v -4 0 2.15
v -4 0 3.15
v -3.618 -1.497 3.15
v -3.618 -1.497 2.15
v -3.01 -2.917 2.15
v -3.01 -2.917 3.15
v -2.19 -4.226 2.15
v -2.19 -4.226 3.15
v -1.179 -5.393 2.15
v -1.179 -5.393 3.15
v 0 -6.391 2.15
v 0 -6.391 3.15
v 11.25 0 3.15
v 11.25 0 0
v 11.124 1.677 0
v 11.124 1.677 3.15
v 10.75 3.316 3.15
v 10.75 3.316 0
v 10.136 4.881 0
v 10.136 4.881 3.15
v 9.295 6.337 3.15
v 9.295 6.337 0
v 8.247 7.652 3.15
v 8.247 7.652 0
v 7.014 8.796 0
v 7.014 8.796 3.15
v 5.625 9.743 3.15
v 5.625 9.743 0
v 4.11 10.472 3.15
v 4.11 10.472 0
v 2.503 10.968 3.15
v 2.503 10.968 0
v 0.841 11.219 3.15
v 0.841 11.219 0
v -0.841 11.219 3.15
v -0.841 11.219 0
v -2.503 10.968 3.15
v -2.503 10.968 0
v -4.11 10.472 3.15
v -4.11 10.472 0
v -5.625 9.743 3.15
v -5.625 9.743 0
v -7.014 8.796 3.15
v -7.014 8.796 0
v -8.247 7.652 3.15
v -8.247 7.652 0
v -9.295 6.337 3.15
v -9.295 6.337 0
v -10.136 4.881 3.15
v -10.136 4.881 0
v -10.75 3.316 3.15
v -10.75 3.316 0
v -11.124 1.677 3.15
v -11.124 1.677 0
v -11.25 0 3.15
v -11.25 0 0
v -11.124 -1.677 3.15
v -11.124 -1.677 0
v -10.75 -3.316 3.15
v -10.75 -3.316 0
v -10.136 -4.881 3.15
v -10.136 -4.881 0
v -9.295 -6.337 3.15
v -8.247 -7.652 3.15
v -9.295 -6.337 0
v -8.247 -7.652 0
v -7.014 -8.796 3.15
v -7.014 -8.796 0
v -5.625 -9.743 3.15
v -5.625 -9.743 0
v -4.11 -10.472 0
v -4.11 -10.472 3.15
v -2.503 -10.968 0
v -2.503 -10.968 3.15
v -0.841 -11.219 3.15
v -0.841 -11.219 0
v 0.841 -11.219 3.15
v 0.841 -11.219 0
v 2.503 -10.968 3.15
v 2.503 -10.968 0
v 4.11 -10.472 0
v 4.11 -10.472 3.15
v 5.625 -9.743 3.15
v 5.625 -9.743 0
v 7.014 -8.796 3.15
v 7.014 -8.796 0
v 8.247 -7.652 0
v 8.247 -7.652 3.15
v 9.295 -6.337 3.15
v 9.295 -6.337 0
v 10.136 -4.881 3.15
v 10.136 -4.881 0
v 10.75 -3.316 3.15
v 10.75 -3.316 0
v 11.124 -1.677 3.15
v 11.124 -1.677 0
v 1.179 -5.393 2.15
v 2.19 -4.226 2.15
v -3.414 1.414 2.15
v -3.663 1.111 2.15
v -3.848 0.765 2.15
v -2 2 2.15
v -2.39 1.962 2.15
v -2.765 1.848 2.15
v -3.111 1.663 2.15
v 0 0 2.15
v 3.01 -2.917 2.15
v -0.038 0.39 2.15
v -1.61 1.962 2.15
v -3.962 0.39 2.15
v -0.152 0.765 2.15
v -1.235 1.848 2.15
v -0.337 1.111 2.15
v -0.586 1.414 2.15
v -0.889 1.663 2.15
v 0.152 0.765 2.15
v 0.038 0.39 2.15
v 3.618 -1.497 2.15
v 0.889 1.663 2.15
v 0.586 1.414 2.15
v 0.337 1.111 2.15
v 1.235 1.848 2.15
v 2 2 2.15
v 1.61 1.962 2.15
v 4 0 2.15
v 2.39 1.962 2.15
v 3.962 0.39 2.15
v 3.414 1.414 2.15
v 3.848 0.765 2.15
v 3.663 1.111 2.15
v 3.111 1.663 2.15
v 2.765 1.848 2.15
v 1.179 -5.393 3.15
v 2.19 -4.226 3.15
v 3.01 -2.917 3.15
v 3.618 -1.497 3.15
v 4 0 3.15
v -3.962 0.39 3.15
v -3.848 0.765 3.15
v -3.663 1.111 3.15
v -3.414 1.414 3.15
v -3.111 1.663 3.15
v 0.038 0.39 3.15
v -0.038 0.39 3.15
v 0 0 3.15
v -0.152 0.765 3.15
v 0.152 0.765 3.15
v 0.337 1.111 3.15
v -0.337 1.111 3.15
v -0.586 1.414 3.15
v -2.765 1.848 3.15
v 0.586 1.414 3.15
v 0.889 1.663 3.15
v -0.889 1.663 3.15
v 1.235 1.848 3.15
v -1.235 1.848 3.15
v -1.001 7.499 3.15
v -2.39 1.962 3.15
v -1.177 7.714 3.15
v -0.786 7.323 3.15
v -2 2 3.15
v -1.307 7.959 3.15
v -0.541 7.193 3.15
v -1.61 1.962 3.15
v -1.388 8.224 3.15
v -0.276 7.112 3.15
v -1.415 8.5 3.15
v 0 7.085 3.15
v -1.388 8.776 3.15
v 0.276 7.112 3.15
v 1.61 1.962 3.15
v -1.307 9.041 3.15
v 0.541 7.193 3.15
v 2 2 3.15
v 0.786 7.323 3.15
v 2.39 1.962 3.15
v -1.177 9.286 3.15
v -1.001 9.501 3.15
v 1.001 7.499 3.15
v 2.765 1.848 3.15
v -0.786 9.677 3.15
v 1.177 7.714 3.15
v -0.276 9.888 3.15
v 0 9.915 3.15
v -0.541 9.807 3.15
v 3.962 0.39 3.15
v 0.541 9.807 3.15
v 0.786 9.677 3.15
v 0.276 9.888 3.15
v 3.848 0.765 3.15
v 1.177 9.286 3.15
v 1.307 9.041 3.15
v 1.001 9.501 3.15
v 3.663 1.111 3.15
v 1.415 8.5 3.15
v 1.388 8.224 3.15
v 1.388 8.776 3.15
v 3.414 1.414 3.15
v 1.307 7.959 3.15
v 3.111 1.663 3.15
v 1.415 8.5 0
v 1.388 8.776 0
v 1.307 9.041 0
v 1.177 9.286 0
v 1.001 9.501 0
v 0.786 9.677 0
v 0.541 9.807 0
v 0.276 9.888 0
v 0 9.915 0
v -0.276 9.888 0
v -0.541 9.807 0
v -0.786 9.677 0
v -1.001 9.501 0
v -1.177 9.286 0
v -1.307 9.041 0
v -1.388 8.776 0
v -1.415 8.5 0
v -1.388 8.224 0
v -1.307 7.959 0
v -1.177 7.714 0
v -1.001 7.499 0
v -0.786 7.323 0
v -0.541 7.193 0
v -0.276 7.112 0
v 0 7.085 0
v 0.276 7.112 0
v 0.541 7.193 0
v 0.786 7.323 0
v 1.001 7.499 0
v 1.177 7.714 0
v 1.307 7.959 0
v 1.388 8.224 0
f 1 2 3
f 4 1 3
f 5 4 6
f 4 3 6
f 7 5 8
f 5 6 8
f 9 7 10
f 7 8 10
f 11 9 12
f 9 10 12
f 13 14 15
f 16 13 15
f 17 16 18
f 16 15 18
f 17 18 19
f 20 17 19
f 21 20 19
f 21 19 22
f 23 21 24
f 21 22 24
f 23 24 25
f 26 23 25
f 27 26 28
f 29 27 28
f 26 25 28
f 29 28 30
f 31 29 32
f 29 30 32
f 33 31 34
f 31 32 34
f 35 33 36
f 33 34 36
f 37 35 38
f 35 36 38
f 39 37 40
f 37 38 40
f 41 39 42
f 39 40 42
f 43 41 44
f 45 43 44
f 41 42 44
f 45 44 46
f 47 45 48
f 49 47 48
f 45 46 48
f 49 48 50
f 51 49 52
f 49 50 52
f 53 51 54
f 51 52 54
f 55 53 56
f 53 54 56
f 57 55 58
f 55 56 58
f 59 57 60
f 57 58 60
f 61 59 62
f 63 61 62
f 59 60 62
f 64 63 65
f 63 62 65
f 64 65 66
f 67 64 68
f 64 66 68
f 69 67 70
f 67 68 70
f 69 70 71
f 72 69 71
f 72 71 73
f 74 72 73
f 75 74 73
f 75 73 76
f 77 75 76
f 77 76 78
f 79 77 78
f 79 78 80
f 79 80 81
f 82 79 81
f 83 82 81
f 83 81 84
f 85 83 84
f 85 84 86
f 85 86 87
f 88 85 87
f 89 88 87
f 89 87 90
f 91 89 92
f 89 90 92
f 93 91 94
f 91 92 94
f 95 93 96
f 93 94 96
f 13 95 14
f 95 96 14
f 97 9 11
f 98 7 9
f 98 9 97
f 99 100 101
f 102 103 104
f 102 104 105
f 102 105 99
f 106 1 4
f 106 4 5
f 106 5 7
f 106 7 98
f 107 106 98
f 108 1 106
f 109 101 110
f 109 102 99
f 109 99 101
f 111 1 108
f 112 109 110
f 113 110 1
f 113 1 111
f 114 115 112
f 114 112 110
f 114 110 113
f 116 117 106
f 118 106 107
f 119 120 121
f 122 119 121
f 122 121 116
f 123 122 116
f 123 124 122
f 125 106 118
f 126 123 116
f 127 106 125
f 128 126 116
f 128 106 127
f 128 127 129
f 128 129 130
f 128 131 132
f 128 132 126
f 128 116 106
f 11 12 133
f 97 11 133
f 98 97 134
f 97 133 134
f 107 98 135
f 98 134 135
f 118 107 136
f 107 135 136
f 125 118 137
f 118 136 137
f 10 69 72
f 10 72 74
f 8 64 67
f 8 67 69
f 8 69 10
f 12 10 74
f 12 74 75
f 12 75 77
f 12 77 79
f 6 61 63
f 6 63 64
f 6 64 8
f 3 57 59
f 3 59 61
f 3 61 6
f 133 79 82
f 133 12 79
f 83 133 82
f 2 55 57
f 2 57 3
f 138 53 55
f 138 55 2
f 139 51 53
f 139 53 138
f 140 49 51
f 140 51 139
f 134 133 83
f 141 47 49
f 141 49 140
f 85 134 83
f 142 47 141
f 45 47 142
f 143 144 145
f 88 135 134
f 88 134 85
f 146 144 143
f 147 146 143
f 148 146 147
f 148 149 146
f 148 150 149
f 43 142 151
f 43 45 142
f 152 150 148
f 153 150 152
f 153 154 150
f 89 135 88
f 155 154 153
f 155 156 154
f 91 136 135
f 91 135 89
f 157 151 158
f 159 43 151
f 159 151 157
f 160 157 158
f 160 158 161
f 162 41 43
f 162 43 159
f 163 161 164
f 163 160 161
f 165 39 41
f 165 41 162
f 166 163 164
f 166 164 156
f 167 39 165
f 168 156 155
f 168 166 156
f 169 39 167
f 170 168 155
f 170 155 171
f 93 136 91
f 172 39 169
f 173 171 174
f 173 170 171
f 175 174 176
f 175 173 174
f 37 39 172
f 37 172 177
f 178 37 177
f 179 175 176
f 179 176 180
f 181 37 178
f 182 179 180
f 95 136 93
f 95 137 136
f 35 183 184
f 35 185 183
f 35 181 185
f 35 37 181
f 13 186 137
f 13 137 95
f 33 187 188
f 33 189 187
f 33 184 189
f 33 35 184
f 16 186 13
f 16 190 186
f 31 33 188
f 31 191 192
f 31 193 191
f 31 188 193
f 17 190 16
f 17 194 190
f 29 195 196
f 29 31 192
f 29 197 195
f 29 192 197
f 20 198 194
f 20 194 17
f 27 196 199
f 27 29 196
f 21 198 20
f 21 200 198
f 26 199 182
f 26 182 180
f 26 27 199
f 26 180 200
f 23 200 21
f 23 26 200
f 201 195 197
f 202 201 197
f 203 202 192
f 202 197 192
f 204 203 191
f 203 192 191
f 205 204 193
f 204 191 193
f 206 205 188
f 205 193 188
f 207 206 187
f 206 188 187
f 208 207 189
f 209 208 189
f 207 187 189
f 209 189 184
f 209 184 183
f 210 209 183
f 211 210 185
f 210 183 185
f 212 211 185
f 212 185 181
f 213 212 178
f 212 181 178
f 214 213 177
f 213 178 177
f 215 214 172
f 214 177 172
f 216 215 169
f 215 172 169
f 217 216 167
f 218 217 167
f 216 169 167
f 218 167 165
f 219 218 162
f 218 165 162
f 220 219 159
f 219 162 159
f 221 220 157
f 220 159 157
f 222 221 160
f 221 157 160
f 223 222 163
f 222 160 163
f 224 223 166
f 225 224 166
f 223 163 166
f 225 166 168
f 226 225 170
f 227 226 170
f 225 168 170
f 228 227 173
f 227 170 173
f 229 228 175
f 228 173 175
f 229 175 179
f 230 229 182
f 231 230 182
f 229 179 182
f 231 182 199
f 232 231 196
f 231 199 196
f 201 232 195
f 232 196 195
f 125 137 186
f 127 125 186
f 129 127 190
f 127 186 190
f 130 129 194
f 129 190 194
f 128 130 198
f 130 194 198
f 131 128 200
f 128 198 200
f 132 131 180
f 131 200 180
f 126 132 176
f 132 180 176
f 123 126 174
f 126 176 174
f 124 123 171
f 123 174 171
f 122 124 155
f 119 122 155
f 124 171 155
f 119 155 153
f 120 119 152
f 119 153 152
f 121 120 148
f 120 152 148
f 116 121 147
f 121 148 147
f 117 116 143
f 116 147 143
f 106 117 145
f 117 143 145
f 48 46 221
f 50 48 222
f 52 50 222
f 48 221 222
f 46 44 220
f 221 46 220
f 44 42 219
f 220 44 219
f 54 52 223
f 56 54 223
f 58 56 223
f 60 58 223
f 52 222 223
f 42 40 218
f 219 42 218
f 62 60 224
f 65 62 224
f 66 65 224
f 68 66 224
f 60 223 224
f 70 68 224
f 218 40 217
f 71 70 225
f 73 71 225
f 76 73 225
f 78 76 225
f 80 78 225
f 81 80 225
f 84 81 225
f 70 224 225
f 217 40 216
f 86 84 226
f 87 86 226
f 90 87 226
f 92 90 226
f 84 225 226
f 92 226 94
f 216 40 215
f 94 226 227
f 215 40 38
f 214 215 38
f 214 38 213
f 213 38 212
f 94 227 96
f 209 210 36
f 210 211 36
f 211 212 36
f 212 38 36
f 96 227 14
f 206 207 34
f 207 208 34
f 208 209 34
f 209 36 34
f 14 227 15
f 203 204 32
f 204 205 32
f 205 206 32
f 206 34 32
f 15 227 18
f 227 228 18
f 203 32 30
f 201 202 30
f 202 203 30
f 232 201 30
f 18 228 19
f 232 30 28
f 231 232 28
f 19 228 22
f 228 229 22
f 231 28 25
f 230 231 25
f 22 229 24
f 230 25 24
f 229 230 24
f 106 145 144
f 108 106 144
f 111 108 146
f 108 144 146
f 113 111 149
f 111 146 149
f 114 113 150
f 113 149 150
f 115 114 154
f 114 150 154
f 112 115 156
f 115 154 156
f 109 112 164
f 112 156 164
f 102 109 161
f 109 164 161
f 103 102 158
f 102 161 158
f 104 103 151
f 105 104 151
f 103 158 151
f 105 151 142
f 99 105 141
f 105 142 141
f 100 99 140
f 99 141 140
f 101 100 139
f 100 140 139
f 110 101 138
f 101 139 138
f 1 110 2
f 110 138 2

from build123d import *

# Parameters (mm, degrees)
F2_R     = 11.25
F0_DEPTH = 3.15
F3_R     = 1.414991
F4_DEPTH = 3.15
F5_DEPTH = 1


with BuildPart() as f0:
    # F2 (on Top) → F0 (new body)
    with BuildSketch(Plane.XY):
        Circle(F2_R)
    extrude(amount=F0_DEPTH)

    # F3 (on face) → F4 (cut, through all)
    with BuildSketch(Plane.XY.offset(3.15)):
        with Locations((0, 8.5)):
            Circle(F3_R)
    extrude(amount=-F4_DEPTH, mode=Mode.SUBTRACT)

    # F1 (on face) → F5 (cut)
    with BuildSketch(Plane.XY.offset(3.15)):
        with BuildLine():
            ThreePointArc((0, 0), (-2, 2), (-4, 0))
            ThreePointArc((-4, 0), (-2.62543, -3.587054), (0, -6.391252))
            ThreePointArc((0, -6.391252), (2.62543, -3.587054), (4, 0))
            ThreePointArc((4, 0), (2, 2), (0, 0))
        make_face()
    extrude(amount=-F5_DEPTH, mode=Mode.SUBTRACT)


solid = f0.part
